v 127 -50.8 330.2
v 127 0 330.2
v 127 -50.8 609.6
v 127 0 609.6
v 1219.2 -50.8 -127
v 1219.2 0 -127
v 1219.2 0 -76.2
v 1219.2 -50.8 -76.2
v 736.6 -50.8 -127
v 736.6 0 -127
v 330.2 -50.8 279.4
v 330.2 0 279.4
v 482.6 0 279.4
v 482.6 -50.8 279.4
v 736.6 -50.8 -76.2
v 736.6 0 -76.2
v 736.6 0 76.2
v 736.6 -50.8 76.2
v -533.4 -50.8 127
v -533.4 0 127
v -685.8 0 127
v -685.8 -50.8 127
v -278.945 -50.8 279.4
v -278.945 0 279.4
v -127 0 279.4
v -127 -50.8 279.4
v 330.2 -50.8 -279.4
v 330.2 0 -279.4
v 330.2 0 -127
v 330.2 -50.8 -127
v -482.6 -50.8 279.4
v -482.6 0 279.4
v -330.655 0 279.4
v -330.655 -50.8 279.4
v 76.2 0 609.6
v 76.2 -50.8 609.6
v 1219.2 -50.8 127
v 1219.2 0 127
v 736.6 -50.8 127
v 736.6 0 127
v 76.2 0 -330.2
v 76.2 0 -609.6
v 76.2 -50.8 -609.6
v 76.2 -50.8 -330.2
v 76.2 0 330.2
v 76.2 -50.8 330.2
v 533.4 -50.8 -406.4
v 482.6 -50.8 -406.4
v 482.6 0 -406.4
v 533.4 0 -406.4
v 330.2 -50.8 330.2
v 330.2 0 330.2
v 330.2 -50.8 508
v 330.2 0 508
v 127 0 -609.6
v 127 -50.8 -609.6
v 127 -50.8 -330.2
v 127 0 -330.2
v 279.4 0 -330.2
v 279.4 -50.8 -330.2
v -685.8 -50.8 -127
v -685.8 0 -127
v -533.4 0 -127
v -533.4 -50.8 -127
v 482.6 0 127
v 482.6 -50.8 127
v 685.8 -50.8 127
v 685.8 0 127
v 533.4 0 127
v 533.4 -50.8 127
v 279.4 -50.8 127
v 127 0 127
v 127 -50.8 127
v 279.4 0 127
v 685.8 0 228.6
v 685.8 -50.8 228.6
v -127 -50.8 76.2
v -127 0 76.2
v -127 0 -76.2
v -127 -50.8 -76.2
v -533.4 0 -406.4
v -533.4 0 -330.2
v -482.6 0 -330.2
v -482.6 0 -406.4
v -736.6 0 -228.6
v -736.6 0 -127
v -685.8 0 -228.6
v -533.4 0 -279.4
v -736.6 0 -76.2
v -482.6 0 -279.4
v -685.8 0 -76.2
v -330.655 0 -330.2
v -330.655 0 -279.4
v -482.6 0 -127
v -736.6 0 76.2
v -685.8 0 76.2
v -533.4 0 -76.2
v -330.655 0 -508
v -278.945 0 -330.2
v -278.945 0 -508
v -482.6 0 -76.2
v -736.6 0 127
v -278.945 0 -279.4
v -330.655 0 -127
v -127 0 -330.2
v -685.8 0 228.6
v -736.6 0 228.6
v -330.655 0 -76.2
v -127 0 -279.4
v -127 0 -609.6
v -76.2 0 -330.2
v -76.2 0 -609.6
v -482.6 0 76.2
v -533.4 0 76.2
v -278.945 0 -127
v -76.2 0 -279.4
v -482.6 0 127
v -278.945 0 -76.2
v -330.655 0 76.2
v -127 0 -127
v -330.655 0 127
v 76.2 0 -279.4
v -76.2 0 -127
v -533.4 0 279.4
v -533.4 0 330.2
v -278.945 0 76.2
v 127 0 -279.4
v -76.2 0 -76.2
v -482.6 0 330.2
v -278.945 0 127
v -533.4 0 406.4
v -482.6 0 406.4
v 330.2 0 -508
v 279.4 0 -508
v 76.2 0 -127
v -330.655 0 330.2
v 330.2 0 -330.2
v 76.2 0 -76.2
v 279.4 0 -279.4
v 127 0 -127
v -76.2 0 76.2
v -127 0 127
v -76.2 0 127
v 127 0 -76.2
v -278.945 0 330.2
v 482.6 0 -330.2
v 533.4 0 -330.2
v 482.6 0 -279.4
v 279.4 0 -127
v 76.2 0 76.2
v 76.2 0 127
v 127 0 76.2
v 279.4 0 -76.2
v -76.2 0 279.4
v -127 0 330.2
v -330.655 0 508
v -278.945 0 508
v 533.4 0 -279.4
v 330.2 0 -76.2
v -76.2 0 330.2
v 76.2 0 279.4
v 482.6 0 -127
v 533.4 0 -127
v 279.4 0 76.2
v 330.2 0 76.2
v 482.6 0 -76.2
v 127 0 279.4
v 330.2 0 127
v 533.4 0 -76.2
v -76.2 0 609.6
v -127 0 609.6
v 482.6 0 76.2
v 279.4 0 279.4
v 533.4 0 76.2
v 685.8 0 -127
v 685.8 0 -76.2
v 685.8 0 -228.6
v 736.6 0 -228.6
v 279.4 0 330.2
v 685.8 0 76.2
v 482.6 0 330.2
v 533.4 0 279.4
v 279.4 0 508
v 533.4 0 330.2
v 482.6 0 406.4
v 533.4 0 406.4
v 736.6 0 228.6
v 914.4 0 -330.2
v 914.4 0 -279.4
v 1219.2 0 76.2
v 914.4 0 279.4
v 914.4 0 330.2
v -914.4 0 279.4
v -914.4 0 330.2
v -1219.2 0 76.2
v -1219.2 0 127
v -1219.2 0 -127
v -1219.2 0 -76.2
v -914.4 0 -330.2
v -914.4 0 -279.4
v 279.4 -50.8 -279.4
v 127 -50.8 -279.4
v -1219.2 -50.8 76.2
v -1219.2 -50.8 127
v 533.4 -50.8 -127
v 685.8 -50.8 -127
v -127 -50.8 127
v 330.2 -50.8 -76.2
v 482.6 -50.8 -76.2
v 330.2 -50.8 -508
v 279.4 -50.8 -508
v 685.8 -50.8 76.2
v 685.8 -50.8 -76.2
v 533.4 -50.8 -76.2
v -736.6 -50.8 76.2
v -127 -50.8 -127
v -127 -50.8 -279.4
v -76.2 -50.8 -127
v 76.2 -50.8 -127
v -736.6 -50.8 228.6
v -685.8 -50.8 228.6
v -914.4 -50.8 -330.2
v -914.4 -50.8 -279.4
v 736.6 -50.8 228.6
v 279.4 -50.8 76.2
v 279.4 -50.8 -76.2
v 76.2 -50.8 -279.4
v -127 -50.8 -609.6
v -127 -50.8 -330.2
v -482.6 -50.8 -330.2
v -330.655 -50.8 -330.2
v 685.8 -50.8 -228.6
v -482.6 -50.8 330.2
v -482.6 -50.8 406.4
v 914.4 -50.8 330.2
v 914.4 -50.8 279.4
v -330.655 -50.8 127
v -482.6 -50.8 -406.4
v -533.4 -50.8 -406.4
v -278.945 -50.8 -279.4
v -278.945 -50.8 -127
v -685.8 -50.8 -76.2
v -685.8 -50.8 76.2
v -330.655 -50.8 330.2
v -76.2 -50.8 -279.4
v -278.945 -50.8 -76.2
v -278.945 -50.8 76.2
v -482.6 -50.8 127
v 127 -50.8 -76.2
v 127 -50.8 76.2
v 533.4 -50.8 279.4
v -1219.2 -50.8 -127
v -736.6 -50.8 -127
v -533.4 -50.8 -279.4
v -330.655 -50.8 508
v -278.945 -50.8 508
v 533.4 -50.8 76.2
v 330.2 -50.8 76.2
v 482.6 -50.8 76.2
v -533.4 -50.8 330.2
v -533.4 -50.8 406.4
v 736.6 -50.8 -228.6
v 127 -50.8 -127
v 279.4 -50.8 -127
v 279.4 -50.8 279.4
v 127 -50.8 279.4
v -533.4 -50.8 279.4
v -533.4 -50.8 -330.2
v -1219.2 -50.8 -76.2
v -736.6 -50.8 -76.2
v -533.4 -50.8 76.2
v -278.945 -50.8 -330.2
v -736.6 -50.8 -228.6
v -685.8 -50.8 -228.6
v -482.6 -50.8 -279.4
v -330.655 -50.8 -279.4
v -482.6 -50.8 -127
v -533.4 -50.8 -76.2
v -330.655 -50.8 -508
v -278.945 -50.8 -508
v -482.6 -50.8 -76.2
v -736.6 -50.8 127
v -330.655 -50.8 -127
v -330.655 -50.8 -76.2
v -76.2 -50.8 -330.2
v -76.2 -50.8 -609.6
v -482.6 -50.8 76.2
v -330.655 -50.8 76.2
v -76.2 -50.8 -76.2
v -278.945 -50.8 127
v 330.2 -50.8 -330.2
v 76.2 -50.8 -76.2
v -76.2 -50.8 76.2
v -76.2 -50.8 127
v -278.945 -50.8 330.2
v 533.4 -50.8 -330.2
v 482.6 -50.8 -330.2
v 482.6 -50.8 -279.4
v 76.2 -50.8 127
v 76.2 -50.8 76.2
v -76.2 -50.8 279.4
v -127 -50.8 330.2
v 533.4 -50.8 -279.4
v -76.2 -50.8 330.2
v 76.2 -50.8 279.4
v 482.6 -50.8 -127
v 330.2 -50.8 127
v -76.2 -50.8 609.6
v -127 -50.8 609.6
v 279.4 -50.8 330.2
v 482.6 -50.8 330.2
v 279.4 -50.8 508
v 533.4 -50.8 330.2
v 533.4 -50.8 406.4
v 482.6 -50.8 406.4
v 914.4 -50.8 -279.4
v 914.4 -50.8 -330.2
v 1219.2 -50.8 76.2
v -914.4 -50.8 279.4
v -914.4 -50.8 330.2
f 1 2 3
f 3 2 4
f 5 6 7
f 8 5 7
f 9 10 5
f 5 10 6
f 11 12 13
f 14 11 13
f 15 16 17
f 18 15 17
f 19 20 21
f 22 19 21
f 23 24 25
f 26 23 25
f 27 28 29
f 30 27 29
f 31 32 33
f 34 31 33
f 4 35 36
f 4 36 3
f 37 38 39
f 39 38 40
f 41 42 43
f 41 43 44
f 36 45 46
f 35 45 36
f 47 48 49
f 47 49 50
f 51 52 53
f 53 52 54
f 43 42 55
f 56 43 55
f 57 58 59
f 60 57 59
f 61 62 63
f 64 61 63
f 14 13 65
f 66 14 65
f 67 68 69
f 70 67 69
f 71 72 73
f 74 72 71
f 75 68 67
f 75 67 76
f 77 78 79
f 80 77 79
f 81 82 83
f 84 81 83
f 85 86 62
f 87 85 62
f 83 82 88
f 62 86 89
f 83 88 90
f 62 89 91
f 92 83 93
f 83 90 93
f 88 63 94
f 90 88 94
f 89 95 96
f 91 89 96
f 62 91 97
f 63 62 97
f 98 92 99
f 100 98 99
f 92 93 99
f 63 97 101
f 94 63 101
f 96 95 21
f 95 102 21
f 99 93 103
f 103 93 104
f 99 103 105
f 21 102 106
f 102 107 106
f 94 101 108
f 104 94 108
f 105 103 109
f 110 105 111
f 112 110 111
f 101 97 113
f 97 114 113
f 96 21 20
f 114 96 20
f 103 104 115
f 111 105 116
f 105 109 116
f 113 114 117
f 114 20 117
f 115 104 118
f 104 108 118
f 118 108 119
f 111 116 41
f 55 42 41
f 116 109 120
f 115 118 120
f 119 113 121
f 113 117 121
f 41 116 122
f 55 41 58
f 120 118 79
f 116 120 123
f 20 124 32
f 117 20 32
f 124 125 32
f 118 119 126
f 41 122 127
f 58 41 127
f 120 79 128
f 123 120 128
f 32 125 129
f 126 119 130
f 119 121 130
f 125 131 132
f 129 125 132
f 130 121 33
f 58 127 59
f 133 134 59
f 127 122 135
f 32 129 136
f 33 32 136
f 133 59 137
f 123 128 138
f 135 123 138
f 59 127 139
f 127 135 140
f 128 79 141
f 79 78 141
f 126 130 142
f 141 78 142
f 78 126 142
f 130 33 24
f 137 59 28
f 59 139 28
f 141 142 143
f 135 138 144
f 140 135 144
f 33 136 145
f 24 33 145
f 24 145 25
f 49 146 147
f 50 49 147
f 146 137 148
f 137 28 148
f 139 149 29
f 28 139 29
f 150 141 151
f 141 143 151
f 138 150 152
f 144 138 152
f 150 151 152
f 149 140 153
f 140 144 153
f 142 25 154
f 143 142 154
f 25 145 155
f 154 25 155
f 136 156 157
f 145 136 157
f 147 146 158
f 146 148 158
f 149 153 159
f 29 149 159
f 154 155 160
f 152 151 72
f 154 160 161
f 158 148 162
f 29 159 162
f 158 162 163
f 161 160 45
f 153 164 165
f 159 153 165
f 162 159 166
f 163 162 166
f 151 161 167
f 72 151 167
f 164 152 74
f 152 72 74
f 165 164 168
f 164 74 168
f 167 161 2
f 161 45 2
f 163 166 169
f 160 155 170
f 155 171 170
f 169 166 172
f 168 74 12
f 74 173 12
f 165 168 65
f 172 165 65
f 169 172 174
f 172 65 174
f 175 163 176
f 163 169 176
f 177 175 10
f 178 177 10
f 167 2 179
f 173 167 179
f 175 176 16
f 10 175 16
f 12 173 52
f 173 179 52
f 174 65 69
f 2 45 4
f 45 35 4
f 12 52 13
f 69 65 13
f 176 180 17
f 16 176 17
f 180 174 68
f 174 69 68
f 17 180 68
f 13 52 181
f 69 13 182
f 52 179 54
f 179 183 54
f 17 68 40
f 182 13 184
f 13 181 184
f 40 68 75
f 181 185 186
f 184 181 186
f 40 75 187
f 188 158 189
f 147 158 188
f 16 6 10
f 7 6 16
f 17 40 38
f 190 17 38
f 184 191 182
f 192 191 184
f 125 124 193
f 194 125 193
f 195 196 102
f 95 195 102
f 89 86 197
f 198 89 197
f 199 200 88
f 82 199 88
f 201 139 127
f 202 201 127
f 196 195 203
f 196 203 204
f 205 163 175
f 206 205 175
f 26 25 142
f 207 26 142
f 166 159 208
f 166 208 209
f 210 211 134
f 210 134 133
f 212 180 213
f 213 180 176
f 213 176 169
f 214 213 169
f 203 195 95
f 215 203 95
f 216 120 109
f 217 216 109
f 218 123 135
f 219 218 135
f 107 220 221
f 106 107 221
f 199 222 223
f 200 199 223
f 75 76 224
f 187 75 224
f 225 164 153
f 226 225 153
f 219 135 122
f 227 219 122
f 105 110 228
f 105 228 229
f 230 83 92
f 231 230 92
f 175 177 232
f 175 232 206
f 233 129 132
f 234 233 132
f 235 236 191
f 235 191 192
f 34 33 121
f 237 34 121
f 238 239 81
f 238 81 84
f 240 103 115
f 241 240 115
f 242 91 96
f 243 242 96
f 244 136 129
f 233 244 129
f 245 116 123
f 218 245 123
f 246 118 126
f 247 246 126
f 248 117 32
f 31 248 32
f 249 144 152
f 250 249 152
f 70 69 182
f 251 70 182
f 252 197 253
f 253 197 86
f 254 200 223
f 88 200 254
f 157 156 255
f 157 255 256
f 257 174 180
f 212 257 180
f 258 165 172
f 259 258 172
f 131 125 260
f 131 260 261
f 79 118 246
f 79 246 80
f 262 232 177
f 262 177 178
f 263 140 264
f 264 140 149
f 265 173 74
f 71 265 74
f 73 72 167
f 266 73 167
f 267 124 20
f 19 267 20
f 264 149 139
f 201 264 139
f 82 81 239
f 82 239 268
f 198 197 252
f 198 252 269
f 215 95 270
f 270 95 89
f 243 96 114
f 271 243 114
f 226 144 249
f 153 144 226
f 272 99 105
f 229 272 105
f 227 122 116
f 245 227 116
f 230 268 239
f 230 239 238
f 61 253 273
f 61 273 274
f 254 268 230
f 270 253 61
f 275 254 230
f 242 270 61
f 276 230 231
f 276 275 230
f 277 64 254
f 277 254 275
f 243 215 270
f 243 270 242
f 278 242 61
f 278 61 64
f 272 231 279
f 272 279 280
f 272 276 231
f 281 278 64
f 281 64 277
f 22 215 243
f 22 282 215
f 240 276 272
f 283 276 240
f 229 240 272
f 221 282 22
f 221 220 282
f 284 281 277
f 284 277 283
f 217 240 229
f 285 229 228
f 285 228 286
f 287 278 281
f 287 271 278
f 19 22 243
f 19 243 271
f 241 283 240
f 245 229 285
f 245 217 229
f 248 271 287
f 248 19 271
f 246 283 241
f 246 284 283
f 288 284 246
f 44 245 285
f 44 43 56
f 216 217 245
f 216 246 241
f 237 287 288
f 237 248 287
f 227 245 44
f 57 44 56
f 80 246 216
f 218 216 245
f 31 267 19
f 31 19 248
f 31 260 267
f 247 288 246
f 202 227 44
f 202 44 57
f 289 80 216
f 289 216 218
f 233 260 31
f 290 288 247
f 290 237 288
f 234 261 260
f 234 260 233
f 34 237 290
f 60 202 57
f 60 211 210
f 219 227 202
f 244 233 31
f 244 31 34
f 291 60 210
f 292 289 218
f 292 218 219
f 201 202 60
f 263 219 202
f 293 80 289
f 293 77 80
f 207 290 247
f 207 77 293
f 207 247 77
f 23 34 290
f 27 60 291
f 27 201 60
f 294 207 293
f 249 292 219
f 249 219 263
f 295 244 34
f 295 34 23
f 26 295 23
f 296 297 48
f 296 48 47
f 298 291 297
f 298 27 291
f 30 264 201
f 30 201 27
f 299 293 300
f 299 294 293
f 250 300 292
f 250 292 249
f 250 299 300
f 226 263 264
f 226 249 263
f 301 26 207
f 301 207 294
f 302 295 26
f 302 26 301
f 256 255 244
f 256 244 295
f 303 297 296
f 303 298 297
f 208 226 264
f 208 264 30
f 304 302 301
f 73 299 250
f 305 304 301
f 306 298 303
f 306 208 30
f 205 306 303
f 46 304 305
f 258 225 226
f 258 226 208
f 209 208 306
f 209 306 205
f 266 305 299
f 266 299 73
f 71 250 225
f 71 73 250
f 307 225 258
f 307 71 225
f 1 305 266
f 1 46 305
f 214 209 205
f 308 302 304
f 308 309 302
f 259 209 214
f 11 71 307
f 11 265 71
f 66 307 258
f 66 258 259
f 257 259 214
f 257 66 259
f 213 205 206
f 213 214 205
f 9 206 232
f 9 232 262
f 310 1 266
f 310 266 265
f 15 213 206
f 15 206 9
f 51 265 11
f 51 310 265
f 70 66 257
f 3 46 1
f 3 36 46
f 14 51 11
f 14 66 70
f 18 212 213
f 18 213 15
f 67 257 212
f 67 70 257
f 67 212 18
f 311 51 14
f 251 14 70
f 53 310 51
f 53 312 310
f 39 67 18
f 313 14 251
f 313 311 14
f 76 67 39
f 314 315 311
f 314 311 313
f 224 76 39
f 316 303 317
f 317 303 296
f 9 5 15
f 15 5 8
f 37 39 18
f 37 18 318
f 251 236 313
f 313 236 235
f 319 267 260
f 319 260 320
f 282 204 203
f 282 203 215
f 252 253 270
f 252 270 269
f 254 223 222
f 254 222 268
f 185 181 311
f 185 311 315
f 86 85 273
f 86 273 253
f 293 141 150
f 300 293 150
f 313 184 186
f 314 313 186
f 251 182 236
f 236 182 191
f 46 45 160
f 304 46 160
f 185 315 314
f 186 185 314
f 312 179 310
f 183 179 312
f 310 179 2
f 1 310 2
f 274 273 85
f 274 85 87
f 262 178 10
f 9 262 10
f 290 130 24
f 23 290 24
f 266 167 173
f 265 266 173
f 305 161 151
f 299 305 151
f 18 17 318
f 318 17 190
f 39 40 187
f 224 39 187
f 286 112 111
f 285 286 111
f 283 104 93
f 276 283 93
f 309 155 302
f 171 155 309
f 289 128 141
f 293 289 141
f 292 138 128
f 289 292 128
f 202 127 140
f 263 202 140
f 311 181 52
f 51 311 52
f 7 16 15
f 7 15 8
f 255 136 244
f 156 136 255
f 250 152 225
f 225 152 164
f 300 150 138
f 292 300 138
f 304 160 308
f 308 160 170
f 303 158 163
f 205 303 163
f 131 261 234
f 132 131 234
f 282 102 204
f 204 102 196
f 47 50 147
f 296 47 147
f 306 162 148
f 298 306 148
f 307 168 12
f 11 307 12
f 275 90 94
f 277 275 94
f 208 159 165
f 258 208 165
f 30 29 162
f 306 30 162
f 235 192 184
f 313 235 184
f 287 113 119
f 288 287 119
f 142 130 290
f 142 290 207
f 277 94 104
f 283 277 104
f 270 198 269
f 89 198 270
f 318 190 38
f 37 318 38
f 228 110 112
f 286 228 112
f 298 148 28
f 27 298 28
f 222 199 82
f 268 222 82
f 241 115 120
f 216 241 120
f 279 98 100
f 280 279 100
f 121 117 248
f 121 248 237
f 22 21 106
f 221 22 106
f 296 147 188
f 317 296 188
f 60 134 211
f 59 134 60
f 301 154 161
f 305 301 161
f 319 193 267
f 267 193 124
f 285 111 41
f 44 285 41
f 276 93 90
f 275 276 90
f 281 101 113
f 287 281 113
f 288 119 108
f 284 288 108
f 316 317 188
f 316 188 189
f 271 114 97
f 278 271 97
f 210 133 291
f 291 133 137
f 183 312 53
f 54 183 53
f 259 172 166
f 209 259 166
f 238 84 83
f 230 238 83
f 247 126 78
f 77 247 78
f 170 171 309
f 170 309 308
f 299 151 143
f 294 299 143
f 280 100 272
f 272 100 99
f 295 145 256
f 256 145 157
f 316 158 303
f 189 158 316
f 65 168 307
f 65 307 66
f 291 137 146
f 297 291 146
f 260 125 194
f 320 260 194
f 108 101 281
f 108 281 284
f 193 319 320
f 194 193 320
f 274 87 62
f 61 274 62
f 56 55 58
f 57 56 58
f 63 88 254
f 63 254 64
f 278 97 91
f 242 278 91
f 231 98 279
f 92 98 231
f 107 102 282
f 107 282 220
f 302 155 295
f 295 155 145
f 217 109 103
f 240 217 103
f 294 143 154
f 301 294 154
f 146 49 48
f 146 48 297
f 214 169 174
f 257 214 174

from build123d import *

# Parameters (mm, degrees)
F0_W     = 482.6
F0_H     = 50.8
F0_W_2   = 50.8
F0_W_3   = 152.4
F0_H_2   = 101.6
F0_W_4   = 482.6000000003
F0_H_3   = 152.4
F0_W_5   = 381.0000000003
F0_W_6   = 151.9448201656
F0_H_4   = 76.2
F0_W_7   = 51.7103596687
F0_H_5   = 177.8
F0_H_6   = 279.4
F0_W_8   = 380.9999999997
F1_DEPTH = 50.8


with BuildPart() as f1:
    # F0 (on Front) → F1 (new body)
    with BuildSketch(Plane.XZ):
        with Locations((-977.9, 101.6)):
            Rectangle(F0_W, F0_H)
        with Locations((-711.2, 101.6)):
            Rectangle(F0_W_2, F0_H)
        Polygon((-685.8, 76.2), (-736.6, 76.2), (-736.6, -76.2), (-685.8, -76.2), (-685.8, 0), align=None)
        with Locations((-609.6, 101.6)):
            Rectangle(F0_W_3, F0_H)
        with Locations((-711.2, 177.8)):
            Rectangle(F0_W_2, F0_H_2)
        with Locations((-977.9000000001, -101.6)):
            Rectangle(F0_W_4, F0_H)
        with Locations((-711.2, -101.6)):
            Rectangle(F0_W_2, F0_H)
        with Locations((-508, 101.6)):
            Rectangle(F0_W_2, F0_H)
        with Locations((-609.6, -101.6)):
            Rectangle(F0_W_3, F0_H)
        with Locations((-711.2, -177.8)):
            Rectangle(F0_W_2, F0_H_2)
        with Locations((-508, 203.2)):
            Rectangle(F0_W_2, F0_H_3)
        with Locations((-508, -101.6)):
            Rectangle(F0_W_2, F0_H)
        with Locations((-508, 304.8)):
            Rectangle(F0_W_2, F0_H)
        with Locations((-723.9000000001, 304.8)):
            Rectangle(F0_W_5, F0_H)
        with Locations((-508, -203.2)):
            Rectangle(F0_W_2, F0_H_3)
        with Locations((-406.6275899172, 304.8)):
            Rectangle(F0_W_6, F0_H)
        with Locations((-508, 368.3)):
            Rectangle(F0_W_2, F0_H_4)
        with Locations((-723.9000000001, -304.8)):
            Rectangle(F0_W_5, F0_H)
        with Locations((-508, -304.8)):
            Rectangle(F0_W_2, F0_H)
        with Locations((-304.8, 304.8)):
            Rectangle(F0_W_7, F0_H)
        with Locations((-406.6275899172, -304.8)):
            Rectangle(F0_W_6, F0_H)
        with Locations((-508, -368.3)):
            Rectangle(F0_W_2, F0_H_4)
        with Locations((-202.9724100828, 304.8)):
            Rectangle(F0_W_6, F0_H)
        with Locations((-304.8, 419.1)):
            Rectangle(F0_W_7, F0_H_5)
        with Locations((-304.8, -304.8)):
            Rectangle(F0_W_7, F0_H)
        with Locations((-101.6, 304.8)):
            Rectangle(F0_W_2, F0_H)
        with Locations((-202.9724100828, -304.8)):
            Rectangle(F0_W_6, F0_H)
        with Locations((-304.8, -419.1)):
            Rectangle(F0_W_7, F0_H_5)
        Polygon((-76.2, 330.2), (-76.2, 279.4), (-2e-10, 279.4), (76.2, 279.4), (76.2, 330.2), align=None)
        with Locations((-101.6, 469.9)):
            Rectangle(F0_W_2, F0_H_6)
        with Locations((-101.6, -304.8)):
            Rectangle(F0_W_2, F0_H)
        with Locations((101.6, 304.8)):
            Rectangle(F0_W_2, F0_H)
        Polygon((-3e-10, -279.4), (-76.2, -279.4), (-76.2, -330.2), (76.2, -330.2), (76.2, -279.4), align=None)
        with Locations((-101.6, -469.9)):
            Rectangle(F0_W_2, F0_H_6)
        with Locations((203.2, 304.8)):
            Rectangle(F0_W_3, F0_H)
        with Locations((101.6, 469.9)):
            Rectangle(F0_W_2, F0_H_6)
        with Locations((101.6, -304.8)):
            Rectangle(F0_W_2, F0_H)
        with Locations((508, 101.6)):
            Rectangle(F0_W_2, F0_H)
        with Locations((304.8, 304.8)):
            Rectangle(F0_W_2, F0_H)
        with Locations((203.2, -304.8)):
            Rectangle(F0_W_3, F0_H)
        with Locations((101.6, -469.9)):
            Rectangle(F0_W_2, F0_H_6)
        with Locations((609.6, 101.6)):
            Rectangle(F0_W_3, F0_H)
        with Locations((508, 203.2)):
            Rectangle(F0_W_2, F0_H_3)
        with Locations((406.4, 304.8)):
            Rectangle(F0_W_3, F0_H)
        with Locations((304.8, 419.1)):
            Rectangle(F0_W_2, F0_H_5)
        with Locations((508, -101.6)):
            Rectangle(F0_W_2, F0_H)
        with Locations((304.8, -304.8)):
            Rectangle(F0_W_2, F0_H)
        with Locations((711.2, 101.6)):
            Rectangle(F0_W_2, F0_H)
        Polygon((736.6, 76.2), (685.8, 76.2), (685.8, 0), (685.8, -76.2), (736.6, -76.2), align=None)
        with Locations((508, 304.8)):
            Rectangle(F0_W_2, F0_H)
        with Locations((609.6, -101.6)):
            Rectangle(F0_W_3, F0_H)
        with Locations((508, -203.2)):
            Rectangle(F0_W_2, F0_H_3)
        with Locations((406.4, -304.8)):
            Rectangle(F0_W_3, F0_H)
        with Locations((304.8, -419.1)):
            Rectangle(F0_W_2, F0_H_5)
        with Locations((977.9000000001, 101.6)):
            Rectangle(F0_W_4, F0_H)
        with Locations((711.2, 177.8)):
            Rectangle(F0_W_2, F0_H_2)
        with Locations((723.8999999999, 304.8)):
            Rectangle(F0_W_8, F0_H)
        with Locations((508, 368.3)):
            Rectangle(F0_W_2, F0_H_4)
        with Locations((711.2, -101.6)):
            Rectangle(F0_W_2, F0_H)
        with Locations((508, -304.8)):
            Rectangle(F0_W_2, F0_H)
        with Locations((977.9, -101.6)):
            Rectangle(F0_W, F0_H)
        with Locations((711.2, -177.8)):
            Rectangle(F0_W_2, F0_H_2)
        with Locations((723.8999999999, -304.8)):
            Rectangle(F0_W_8, F0_H)
        with Locations((508, -368.3)):
            Rectangle(F0_W_2, F0_H_4)
        with Locations((-304.8, 203.2)):
            Rectangle(F0_W_7, F0_H_3)
        with Locations((-101.6, 203.2)):
            Rectangle(F0_W_2, F0_H_3)
        with Locations((101.6, 203.2)):
            Rectangle(F0_W_2, F0_H_3)
        with Locations((304.8, 203.2)):
            Rectangle(F0_W_2, F0_H_3)
        Polygon((330.2, 76.2), (279.4, 76.2), (279.4, 0), (304.8, 0), (330.2, 0), align=None)
        Polygon((304.8, 0), (279.4, 0), (279.4, -76.2), (330.2, -76.2), (330.2, 0), align=None)
        with Locations((304.8, -101.6)):
            Rectangle(F0_W_2, F0_H)
        with Locations((304.8, -203.2)):
            Rectangle(F0_W_2, F0_H_3)
        with Locations((304.8, 101.6)):
            Rectangle(F0_W_2, F0_H)
        Polygon((533.4, 76.2), (482.6, 76.2), (482.6, 0), (508, 0), (533.4, 0), align=None)
        Polygon((508, 0), (482.6, 0), (482.6, -76.2), (533.4, -76.2), (533.4, 0), align=None)
        with Locations((101.6, -203.2)):
            Rectangle(F0_W_2, F0_H_3)
        with Locations((101.6, -101.6)):
            Rectangle(F0_W_2, F0_H)
        Polygon((101.6, 0), (76.2, 0), (76.2, -76.2), (127, -76.2), (127, 0), align=None)
        Polygon((127, 76.2), (76.2, 76.2), (76.2, 0), (101.6, 0), (127, 0), align=None)
        with Locations((101.6, 101.6)):
            Rectangle(F0_W_2, F0_H)
        with Locations((-101.6, 101.6)):
            Rectangle(F0_W_2, F0_H)
        Polygon((-76.2, 76.2), (-127, 76.2), (-127, 0), (-101.6, 0), (-76.2, 0), align=None)
        Polygon((-101.6, 0), (-127, 0), (-127, -76.2), (-76.2, -76.2), (-76.2, 0), align=None)
        with Locations((-101.6, -101.6)):
            Rectangle(F0_W_2, F0_H)
        with Locations((-101.6, -203.2)):
            Rectangle(F0_W_2, F0_H_3)
        with Locations((-304.8, -203.2)):
            Rectangle(F0_W_7, F0_H_3)
        with Locations((-304.8, -101.6)):
            Rectangle(F0_W_7, F0_H)
        Polygon((-304.8, 0), (-330.6551798344, 0), (-330.6551798344, -76.2), (-278.9448201656, -76.2), (-278.9448201656, 0), align=None)
        Polygon((-278.9448201656, 76.2), (-330.6551798344, 76.2), (-330.6551798344, 0), (-304.8, 0), (-278.9448201656, 0), align=None)
        with Locations((-304.8, 101.6)):
            Rectangle(F0_W_7, F0_H)
        Polygon((-482.6, 76.2), (-533.4, 76.2), (-533.4, 0), (-508, 0), (-482.6, 0), align=None)
        Polygon((-508, 0), (-533.4, 0), (-533.4, -76.2), (-482.6, -76.2), (-482.6, 0), align=None)
        with Locations((-406.6275899172, 101.6)):
            Rectangle(F0_W_6, F0_H)
        with Locations((-202.9724100828, 101.6)):
            Rectangle(F0_W_6, F0_H)
        Polygon((-76.2, 127), (-76.2, 76.2), (76.2, 76.2), (76.2, 127), (0, 127), align=None)
        with Locations((203.2, 101.6)):
            Rectangle(F0_W_3, F0_H)
        with Locations((406.4, 101.6)):
            Rectangle(F0_W_3, F0_H)
        with Locations((406.4, -101.6)):
            Rectangle(F0_W_3, F0_H)
        with Locations((203.2, -101.6)):
            Rectangle(F0_W_3, F0_H)
        Polygon((76.2, -76.2), (-76.2, -76.2), (-76.2, -127), (-3e-10, -127), (76.2, -127), align=None)
        with Locations((-202.9724100828, -101.6)):
            Rectangle(F0_W_6, F0_H)
        with Locations((-406.6275899172, -101.6)):
            Rectangle(F0_W_6, F0_H)
    extrude(amount=F1_DEPTH)


solid = f1.part
